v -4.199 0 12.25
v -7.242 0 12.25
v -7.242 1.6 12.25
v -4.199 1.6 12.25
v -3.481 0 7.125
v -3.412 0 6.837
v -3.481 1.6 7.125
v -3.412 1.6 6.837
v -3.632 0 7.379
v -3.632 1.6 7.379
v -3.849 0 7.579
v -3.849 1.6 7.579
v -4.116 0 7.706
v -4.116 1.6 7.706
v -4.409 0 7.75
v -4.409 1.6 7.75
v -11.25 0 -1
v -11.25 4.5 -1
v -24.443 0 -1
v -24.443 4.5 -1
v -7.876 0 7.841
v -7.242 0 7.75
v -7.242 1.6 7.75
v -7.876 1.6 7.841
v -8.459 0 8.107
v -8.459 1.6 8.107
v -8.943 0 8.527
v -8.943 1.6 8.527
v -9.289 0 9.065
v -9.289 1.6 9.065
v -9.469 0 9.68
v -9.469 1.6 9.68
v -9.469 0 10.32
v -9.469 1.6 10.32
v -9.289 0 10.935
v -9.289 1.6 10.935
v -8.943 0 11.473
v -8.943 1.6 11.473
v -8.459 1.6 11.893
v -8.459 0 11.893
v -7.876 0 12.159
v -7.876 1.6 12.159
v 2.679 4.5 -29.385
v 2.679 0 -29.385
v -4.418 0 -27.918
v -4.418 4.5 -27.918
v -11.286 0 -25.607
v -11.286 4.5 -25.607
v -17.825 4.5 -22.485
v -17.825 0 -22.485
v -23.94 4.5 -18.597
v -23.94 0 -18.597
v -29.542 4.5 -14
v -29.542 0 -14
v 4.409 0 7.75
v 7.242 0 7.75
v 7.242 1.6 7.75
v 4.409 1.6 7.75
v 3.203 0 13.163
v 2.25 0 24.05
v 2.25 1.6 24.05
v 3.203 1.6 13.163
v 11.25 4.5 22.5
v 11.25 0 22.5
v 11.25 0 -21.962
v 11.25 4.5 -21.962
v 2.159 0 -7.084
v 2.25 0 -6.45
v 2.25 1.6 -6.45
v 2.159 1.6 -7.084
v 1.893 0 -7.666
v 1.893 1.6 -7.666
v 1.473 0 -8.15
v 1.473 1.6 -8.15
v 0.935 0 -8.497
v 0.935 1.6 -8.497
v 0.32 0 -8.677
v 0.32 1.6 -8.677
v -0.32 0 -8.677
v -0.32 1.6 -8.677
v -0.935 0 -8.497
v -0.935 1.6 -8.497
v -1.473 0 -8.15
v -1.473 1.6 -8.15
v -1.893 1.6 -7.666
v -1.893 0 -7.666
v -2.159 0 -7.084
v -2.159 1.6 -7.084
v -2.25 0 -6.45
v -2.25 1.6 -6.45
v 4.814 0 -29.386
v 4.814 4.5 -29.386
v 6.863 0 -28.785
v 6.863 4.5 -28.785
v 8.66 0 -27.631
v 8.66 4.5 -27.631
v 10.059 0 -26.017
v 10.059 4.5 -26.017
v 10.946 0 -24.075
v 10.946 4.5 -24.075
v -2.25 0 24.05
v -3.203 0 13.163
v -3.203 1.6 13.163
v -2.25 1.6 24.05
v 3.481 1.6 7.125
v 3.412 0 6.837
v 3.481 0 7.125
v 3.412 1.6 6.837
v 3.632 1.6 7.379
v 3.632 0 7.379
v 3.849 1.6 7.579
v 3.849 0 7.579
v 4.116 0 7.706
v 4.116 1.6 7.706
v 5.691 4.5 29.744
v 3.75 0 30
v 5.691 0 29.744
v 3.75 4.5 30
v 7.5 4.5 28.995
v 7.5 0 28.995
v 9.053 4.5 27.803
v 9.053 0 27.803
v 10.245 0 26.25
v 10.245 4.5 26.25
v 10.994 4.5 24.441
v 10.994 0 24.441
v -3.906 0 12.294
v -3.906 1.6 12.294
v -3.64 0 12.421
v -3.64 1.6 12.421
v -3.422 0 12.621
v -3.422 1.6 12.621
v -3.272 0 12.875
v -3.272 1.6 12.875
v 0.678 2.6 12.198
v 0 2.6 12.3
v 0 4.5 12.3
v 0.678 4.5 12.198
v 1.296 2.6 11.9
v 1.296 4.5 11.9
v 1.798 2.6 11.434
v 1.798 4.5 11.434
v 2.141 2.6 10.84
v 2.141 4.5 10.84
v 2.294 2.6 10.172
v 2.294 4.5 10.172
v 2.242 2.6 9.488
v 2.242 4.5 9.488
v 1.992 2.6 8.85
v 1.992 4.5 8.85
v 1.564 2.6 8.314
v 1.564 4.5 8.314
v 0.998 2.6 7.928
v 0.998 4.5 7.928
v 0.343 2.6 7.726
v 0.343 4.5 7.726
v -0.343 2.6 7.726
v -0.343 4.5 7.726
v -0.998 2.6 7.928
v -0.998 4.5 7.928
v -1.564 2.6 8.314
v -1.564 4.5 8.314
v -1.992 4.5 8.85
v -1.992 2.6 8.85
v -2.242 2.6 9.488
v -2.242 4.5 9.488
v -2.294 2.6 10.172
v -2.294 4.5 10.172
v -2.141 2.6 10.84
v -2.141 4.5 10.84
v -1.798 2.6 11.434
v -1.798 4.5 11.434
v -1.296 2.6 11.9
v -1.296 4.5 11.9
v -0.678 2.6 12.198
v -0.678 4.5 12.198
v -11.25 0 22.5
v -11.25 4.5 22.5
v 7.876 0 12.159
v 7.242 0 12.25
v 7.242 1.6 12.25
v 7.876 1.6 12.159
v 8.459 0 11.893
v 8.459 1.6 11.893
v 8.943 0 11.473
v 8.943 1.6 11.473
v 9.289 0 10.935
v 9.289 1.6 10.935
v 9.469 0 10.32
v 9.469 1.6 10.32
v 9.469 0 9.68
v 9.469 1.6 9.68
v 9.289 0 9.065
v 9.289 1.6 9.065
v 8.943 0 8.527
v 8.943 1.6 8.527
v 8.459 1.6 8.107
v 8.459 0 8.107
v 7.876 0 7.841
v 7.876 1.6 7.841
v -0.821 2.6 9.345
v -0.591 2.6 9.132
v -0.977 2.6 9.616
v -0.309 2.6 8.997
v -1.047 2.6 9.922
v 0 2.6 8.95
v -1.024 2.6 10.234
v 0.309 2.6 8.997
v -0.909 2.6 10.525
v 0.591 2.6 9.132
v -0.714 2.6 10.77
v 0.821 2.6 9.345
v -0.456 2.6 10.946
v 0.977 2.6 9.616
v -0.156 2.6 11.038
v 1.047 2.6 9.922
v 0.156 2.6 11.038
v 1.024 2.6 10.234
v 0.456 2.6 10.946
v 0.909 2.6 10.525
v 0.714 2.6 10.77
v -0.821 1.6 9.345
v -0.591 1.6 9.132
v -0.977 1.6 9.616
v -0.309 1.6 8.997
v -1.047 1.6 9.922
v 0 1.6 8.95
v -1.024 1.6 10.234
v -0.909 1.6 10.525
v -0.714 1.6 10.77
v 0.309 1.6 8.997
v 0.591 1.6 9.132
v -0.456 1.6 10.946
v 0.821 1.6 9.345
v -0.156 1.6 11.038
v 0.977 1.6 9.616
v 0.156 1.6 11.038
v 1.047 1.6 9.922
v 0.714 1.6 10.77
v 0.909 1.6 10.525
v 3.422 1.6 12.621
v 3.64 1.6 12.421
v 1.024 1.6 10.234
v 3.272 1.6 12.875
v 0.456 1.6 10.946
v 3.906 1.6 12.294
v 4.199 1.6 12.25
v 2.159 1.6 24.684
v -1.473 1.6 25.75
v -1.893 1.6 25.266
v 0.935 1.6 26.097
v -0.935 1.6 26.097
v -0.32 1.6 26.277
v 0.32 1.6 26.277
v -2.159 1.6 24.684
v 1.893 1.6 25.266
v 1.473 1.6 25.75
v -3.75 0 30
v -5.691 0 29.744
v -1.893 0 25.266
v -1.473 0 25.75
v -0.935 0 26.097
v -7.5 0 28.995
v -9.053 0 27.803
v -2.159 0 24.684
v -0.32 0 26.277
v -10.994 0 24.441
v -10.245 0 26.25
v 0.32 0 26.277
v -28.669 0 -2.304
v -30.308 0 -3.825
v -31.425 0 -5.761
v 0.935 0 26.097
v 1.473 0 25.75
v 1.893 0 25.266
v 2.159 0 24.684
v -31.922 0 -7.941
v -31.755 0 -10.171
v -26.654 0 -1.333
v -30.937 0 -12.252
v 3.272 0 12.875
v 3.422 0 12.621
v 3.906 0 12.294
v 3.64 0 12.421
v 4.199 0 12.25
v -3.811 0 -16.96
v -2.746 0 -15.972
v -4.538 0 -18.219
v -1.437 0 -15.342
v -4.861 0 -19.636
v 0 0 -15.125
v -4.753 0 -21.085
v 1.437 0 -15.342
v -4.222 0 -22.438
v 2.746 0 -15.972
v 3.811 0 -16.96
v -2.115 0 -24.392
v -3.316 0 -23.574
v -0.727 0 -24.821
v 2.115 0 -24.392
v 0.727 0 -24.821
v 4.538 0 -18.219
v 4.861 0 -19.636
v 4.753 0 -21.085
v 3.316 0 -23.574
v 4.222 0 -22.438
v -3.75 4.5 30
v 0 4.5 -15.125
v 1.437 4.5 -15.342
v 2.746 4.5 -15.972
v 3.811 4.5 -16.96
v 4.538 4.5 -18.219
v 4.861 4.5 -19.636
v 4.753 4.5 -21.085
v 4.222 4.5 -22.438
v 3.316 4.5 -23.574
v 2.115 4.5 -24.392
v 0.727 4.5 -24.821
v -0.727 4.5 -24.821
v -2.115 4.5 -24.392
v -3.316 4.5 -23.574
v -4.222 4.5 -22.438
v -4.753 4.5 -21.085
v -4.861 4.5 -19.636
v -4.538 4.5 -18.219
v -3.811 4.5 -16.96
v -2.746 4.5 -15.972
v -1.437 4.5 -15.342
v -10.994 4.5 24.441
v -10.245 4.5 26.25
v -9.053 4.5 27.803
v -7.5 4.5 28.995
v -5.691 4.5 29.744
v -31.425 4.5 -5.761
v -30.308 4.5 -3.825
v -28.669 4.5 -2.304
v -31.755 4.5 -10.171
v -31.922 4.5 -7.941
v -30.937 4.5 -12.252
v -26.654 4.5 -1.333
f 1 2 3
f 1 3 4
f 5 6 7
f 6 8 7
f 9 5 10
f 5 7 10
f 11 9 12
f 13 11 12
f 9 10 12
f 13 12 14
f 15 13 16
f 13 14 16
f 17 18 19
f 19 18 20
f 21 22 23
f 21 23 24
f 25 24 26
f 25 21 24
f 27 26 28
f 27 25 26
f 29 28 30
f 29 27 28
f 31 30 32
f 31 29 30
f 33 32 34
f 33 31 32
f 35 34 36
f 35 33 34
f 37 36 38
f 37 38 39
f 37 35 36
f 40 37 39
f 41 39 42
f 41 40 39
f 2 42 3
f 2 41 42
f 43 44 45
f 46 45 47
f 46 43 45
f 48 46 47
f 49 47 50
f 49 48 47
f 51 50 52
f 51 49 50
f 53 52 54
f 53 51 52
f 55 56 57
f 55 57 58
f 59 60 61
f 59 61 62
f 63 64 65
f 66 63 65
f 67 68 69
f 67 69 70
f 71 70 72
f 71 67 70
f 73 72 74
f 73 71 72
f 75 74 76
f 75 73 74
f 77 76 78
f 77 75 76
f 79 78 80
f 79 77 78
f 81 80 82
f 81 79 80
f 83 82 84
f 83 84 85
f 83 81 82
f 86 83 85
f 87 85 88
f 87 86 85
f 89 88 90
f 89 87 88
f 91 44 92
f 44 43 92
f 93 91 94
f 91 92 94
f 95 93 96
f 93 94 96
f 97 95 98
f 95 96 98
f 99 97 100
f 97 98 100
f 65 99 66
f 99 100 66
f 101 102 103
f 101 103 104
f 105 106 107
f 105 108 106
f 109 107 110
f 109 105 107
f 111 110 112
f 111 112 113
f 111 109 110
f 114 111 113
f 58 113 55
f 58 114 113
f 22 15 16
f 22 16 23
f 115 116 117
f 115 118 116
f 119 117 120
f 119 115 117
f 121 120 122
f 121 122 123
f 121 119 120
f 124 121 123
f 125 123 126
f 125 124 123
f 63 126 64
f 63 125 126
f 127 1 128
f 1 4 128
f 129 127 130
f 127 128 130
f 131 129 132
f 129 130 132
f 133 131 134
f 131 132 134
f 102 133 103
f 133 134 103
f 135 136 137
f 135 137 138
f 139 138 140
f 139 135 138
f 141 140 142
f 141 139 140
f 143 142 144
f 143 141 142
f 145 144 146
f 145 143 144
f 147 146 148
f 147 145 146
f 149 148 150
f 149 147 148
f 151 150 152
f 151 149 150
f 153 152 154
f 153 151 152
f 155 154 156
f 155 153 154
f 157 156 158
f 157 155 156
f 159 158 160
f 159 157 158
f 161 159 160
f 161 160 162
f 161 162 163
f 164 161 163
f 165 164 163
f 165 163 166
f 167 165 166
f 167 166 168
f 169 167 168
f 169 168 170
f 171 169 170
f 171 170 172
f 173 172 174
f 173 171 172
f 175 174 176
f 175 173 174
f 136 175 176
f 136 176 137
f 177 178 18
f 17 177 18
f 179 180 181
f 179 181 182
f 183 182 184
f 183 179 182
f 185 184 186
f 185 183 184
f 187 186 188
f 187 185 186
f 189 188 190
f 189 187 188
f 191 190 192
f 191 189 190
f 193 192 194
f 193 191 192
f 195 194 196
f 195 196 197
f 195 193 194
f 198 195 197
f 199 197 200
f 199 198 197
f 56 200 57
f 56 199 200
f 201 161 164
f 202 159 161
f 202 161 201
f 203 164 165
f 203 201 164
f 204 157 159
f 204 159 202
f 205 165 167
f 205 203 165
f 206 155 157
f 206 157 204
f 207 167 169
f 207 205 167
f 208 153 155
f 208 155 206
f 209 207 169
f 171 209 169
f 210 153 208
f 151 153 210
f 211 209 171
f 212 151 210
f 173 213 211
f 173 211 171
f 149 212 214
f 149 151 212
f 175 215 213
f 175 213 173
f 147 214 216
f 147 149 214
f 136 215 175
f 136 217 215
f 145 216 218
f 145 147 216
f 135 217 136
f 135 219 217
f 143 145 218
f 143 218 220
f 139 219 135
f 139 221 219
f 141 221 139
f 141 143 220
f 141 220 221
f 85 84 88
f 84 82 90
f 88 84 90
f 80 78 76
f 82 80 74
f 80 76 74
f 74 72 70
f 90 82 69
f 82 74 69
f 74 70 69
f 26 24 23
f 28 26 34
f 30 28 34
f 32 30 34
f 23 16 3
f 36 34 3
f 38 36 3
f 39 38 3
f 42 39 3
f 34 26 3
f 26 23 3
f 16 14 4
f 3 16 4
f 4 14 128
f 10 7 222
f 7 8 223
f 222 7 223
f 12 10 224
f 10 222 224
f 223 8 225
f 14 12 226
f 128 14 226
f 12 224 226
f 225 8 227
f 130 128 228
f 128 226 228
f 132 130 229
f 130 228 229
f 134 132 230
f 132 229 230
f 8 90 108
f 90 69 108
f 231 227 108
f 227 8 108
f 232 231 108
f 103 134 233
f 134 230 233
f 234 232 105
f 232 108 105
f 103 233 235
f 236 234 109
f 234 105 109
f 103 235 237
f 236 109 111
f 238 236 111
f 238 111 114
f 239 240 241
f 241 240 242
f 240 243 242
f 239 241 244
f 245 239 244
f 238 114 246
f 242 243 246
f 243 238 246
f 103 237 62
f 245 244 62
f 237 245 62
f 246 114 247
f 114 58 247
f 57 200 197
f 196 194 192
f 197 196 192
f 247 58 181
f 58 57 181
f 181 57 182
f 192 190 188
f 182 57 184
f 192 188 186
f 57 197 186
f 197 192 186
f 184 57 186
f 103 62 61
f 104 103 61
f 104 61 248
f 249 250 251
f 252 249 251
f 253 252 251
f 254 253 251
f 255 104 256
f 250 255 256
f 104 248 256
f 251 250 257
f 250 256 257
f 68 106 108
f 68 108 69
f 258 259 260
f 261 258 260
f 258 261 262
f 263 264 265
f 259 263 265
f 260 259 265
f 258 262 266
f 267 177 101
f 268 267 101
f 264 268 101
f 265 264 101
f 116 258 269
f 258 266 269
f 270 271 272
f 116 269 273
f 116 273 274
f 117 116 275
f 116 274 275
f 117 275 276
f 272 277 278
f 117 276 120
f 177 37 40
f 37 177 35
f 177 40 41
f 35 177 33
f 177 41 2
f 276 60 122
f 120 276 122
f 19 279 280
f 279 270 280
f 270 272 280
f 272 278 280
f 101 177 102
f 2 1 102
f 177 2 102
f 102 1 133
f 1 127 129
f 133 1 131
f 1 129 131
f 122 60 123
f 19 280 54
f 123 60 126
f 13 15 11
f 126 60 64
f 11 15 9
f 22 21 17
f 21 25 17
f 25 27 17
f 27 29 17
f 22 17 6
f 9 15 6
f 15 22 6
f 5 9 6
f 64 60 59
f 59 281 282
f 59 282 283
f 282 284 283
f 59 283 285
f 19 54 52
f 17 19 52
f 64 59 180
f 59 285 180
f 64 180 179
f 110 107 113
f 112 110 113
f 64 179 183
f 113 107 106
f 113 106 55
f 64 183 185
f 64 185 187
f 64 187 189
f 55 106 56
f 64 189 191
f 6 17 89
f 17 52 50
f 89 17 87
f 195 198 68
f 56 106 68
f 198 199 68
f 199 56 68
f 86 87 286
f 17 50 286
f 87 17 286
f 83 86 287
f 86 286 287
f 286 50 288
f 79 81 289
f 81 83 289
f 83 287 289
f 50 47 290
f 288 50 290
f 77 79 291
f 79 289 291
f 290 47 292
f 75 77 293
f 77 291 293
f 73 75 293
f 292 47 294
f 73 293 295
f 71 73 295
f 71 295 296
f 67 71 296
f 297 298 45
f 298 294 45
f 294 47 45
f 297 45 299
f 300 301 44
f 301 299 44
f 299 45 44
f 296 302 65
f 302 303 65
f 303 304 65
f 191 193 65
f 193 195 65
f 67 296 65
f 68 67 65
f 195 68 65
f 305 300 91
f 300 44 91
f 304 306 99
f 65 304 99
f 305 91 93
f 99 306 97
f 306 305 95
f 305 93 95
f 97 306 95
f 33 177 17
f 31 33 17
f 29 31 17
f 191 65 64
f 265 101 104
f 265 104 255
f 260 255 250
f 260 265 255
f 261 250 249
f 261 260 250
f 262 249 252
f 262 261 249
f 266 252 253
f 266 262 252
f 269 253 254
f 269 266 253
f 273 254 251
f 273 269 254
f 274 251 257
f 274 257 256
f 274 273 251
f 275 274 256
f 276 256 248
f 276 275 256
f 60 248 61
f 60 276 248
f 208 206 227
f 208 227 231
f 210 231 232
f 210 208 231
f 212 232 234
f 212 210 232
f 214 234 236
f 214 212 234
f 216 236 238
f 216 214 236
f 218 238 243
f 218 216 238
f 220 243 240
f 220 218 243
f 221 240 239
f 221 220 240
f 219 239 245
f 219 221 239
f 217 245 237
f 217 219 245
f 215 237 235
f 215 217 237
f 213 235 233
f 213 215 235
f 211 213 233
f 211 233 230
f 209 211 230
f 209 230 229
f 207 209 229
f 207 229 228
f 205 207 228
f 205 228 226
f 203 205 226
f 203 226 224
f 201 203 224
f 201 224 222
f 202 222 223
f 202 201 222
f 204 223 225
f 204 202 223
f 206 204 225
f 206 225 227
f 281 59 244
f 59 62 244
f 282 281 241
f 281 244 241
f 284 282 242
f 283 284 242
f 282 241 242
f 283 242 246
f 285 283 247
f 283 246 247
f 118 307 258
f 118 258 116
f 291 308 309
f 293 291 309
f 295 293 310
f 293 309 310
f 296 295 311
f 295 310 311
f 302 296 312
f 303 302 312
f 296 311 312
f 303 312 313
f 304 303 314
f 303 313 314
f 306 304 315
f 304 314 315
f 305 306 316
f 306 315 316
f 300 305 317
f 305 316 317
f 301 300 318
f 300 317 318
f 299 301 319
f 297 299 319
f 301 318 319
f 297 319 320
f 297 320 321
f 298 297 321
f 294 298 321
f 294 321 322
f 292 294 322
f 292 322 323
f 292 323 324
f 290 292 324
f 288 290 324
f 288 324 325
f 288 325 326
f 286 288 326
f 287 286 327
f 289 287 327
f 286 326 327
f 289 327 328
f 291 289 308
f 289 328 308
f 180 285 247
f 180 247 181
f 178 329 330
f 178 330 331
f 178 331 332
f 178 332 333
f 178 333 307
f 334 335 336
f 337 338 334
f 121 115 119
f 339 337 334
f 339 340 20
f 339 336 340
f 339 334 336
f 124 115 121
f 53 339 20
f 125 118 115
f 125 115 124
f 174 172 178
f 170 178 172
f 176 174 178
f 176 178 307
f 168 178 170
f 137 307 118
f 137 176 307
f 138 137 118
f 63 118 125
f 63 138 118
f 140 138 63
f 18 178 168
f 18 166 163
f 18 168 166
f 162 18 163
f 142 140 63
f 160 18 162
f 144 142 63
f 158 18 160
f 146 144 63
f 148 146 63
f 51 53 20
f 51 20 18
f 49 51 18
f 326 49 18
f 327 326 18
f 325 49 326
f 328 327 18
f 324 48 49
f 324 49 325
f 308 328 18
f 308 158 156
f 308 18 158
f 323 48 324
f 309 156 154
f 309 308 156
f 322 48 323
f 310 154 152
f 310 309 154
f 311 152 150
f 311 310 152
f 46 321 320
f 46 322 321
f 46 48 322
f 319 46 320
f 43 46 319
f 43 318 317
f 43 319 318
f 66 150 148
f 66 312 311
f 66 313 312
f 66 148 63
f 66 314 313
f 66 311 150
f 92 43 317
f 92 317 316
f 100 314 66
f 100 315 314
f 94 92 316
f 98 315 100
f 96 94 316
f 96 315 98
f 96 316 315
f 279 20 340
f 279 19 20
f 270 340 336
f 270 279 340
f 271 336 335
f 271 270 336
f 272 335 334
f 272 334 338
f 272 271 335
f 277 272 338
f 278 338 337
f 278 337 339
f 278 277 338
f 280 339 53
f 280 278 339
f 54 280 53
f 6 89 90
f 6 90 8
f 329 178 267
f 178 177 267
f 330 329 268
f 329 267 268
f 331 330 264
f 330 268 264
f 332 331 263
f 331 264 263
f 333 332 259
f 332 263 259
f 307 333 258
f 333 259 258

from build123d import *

# Parameters (mm, degrees)
SKETCH1_W           = 22.5
SKETCH1_H           = 60
BOSS_EXTRUDE1_DEPTH = 4.5
CUT_EXTRUDE3_DEPTH  = 1.6
FILLET1_R           = 1
CUT_EXTRUDE4_START  = -1.9
SKETCH5_R           = 2.3
CUT_EXTRUDE4_DEPTH  = 1.9
SKETCH6_R           = 1.05
CUT_EXTRUDE5_DEPTH  = 1
BOSS_EXTRUDE2_DEPTH = 4.5
CUT_EXTRUDE6_DEPTH  = 4.5
SKETCH11_R          = 4.875
CUT_EXTRUDE8_DEPTH  = 4.5
CUT_EXTRUDE9_DEPTH  = 4.5
FILLET2_R           = 7.5
FILLET3_R           = 7.5


with BuildPart() as part:
    # Sketch1 → Boss-Extrude1 (new body)
    with BuildSketch(Plane(origin=(0, 0, 0), x_dir=(1, 0, 0), z_dir=(0, 1, 0))):
        Rectangle(SKETCH1_W, SKETCH1_H)
    extrude(amount=BOSS_EXTRUDE1_DEPTH)

    # Sketch4 → Cut-Extrude3 (cut)
    with BuildSketch(Plane(origin=(-18.455631439, 0, 11.83964206), x_dir=(0, 0, -1), z_dir=(0, -1, 0))):
        with BuildLine():
            Line((4.08964206, 21.947970461), (18.28964206, 20.705631439))
            ThreePointArc((18.28964206, 20.705631439), (20.53964206, 18.455631439), (18.28964206, 16.205631439))
            Line((18.28964206, 16.205631439), (4.08964206, 14.963292417))
            Line((4.08964206, 14.963292417), (4.08964206, 11.213292417))
            ThreePointArc((4.08964206, 11.213292417), (1.83964206, 8.963292417), (-0.41035794, 11.213292417))
            Line((-0.41035794, 11.213292417), (-0.41035794, 15.17326521))
            Line((-0.41035794, 15.17326521), (-12.21035794, 16.205631439))
            ThreePointArc((-12.21035794, 16.205631439), (-14.46035794, 18.455631439), (-12.21035794, 20.705631439))
            Line((-12.21035794, 20.705631439), (-0.41035794, 21.737997669))
            Line((-0.41035794, 21.737997669), (-0.41035794, 25.697970461))
            ThreePointArc((-0.41035794, 25.697970461), (1.83964206, 27.947970461), (4.08964206, 25.697970461))
            Line((4.08964206, 25.697970461), (4.08964206, 21.947970461))
        make_face()
    extrude(amount=-CUT_EXTRUDE3_DEPTH, mode=Mode.SUBTRACT)

    # Fillet1
    fillet1_edges = [part.edges().sort_by_distance(p)[0] for p in [
        (3.492339022, 0.8, 7.75),
        (-3.492339022, 0.8, 7.75),
        (-3.28236623, 0.8, 12.25),
        (3.28236623, 0.8, 12.25),
    ]]
    fillet(fillet1_edges, radius=FILLET1_R)

    # Sketch5 → Cut-Extrude4 (cut)
    with BuildSketch(Plane(origin=(0, 4.5, 0), x_dir=(1, 0, 0), z_dir=(0, 1, 0)).offset(CUT_EXTRUDE4_START)):
        with Locations(Location((0, -10, 0), (0, 0, 270))):
            Circle(SKETCH5_R)
    extrude(amount=CUT_EXTRUDE4_DEPTH, mode=Mode.SUBTRACT)

    # Sketch6 → Cut-Extrude5 (cut)
    with BuildSketch(Plane(origin=(0, 2.6, 0), x_dir=(-1, 0, 0), z_dir=(0, -1, 0))):
        with Locations(Location((0, -10, 0), (0, 0, 90))):
            Circle(SKETCH6_R)
    extrude(amount=CUT_EXTRUDE5_DEPTH, mode=Mode.SUBTRACT)

    # Sketch9 → Boss-Extrude2 (add)
    with BuildSketch(Plane(origin=(0, 4.5, 0), x_dir=(1, 0, 0), z_dir=(0, 1, 0))):
        with BuildLine():
            Line((-48.75, -30), (-11.25, -30))
            Line((-11.25, -30), (-11.25, 25.621488653))
            ThreePointArc((-11.25, 25.621488653), (-38.499371855, 3.541019662), (-48.75, -30))
        make_face()
    extrude(amount=-BOSS_EXTRUDE2_DEPTH)

    # Sketch10 → Cut-Extrude6 (cut)
    with BuildSketch(Plane(origin=(0, 4.5, 0), x_dir=(1, 0, 0), z_dir=(0, 1, 0))):
        with BuildLine():
            ThreePointArc((-11.25, 25.621488653), (-0.211035747, 28.89520065), (11.25, 30))
            Line((11.25, 30), (-11.25, 30))
            Line((-11.25, 30), (-11.25, 25.621488653))
        make_face()
    extrude(amount=-CUT_EXTRUDE6_DEPTH, mode=Mode.SUBTRACT)

    # Sketch11 → Cut-Extrude8 (cut)
    with BuildSketch(Plane(origin=(0, 4.5, 0), x_dir=(1, 0, 0), z_dir=(0, 1, 0))):
        with Locations(Location((0, 20, 0), (0, 0, 270))):
            Circle(SKETCH11_R)
    extrude(amount=-CUT_EXTRUDE8_DEPTH, mode=Mode.SUBTRACT)

    # Sketch12 → Cut-Extrude9 (cut)
    with BuildSketch(Plane(origin=(0, 4.5, 0), x_dir=(1, 0, 0), z_dir=(0, 1, 0))):
        with BuildLine():
            Line((-11.25, 1), (-40.121198156, 1))
            ThreePointArc((-40.121198156, 1), (-46.552560018, -13.910747211), (-48.75, -30))
            Line((-48.75, -30), (-11.25, -30))
            Line((-11.25, -30), (-11.25, 1))
        make_face()
    extrude(amount=-CUT_EXTRUDE9_DEPTH, mode=Mode.SUBTRACT)

    # Fillet2
    fillet2_edges = [part.edges().sort_by_distance(p)[0] for p in [
        (-40.121198156, 2.25, -1),
    ]]
    fillet(fillet2_edges, radius=FILLET2_R)

    # Fillet3
    fillet3_edges = [part.edges().sort_by_distance(p)[0] for p in [
        (-11.25, 2.25, 30),
        (11.25, 2.25, 30),
        (11.25, 2.25, -30),
    ]]
    fillet(fillet3_edges, radius=FILLET3_R)


solid = part.part
